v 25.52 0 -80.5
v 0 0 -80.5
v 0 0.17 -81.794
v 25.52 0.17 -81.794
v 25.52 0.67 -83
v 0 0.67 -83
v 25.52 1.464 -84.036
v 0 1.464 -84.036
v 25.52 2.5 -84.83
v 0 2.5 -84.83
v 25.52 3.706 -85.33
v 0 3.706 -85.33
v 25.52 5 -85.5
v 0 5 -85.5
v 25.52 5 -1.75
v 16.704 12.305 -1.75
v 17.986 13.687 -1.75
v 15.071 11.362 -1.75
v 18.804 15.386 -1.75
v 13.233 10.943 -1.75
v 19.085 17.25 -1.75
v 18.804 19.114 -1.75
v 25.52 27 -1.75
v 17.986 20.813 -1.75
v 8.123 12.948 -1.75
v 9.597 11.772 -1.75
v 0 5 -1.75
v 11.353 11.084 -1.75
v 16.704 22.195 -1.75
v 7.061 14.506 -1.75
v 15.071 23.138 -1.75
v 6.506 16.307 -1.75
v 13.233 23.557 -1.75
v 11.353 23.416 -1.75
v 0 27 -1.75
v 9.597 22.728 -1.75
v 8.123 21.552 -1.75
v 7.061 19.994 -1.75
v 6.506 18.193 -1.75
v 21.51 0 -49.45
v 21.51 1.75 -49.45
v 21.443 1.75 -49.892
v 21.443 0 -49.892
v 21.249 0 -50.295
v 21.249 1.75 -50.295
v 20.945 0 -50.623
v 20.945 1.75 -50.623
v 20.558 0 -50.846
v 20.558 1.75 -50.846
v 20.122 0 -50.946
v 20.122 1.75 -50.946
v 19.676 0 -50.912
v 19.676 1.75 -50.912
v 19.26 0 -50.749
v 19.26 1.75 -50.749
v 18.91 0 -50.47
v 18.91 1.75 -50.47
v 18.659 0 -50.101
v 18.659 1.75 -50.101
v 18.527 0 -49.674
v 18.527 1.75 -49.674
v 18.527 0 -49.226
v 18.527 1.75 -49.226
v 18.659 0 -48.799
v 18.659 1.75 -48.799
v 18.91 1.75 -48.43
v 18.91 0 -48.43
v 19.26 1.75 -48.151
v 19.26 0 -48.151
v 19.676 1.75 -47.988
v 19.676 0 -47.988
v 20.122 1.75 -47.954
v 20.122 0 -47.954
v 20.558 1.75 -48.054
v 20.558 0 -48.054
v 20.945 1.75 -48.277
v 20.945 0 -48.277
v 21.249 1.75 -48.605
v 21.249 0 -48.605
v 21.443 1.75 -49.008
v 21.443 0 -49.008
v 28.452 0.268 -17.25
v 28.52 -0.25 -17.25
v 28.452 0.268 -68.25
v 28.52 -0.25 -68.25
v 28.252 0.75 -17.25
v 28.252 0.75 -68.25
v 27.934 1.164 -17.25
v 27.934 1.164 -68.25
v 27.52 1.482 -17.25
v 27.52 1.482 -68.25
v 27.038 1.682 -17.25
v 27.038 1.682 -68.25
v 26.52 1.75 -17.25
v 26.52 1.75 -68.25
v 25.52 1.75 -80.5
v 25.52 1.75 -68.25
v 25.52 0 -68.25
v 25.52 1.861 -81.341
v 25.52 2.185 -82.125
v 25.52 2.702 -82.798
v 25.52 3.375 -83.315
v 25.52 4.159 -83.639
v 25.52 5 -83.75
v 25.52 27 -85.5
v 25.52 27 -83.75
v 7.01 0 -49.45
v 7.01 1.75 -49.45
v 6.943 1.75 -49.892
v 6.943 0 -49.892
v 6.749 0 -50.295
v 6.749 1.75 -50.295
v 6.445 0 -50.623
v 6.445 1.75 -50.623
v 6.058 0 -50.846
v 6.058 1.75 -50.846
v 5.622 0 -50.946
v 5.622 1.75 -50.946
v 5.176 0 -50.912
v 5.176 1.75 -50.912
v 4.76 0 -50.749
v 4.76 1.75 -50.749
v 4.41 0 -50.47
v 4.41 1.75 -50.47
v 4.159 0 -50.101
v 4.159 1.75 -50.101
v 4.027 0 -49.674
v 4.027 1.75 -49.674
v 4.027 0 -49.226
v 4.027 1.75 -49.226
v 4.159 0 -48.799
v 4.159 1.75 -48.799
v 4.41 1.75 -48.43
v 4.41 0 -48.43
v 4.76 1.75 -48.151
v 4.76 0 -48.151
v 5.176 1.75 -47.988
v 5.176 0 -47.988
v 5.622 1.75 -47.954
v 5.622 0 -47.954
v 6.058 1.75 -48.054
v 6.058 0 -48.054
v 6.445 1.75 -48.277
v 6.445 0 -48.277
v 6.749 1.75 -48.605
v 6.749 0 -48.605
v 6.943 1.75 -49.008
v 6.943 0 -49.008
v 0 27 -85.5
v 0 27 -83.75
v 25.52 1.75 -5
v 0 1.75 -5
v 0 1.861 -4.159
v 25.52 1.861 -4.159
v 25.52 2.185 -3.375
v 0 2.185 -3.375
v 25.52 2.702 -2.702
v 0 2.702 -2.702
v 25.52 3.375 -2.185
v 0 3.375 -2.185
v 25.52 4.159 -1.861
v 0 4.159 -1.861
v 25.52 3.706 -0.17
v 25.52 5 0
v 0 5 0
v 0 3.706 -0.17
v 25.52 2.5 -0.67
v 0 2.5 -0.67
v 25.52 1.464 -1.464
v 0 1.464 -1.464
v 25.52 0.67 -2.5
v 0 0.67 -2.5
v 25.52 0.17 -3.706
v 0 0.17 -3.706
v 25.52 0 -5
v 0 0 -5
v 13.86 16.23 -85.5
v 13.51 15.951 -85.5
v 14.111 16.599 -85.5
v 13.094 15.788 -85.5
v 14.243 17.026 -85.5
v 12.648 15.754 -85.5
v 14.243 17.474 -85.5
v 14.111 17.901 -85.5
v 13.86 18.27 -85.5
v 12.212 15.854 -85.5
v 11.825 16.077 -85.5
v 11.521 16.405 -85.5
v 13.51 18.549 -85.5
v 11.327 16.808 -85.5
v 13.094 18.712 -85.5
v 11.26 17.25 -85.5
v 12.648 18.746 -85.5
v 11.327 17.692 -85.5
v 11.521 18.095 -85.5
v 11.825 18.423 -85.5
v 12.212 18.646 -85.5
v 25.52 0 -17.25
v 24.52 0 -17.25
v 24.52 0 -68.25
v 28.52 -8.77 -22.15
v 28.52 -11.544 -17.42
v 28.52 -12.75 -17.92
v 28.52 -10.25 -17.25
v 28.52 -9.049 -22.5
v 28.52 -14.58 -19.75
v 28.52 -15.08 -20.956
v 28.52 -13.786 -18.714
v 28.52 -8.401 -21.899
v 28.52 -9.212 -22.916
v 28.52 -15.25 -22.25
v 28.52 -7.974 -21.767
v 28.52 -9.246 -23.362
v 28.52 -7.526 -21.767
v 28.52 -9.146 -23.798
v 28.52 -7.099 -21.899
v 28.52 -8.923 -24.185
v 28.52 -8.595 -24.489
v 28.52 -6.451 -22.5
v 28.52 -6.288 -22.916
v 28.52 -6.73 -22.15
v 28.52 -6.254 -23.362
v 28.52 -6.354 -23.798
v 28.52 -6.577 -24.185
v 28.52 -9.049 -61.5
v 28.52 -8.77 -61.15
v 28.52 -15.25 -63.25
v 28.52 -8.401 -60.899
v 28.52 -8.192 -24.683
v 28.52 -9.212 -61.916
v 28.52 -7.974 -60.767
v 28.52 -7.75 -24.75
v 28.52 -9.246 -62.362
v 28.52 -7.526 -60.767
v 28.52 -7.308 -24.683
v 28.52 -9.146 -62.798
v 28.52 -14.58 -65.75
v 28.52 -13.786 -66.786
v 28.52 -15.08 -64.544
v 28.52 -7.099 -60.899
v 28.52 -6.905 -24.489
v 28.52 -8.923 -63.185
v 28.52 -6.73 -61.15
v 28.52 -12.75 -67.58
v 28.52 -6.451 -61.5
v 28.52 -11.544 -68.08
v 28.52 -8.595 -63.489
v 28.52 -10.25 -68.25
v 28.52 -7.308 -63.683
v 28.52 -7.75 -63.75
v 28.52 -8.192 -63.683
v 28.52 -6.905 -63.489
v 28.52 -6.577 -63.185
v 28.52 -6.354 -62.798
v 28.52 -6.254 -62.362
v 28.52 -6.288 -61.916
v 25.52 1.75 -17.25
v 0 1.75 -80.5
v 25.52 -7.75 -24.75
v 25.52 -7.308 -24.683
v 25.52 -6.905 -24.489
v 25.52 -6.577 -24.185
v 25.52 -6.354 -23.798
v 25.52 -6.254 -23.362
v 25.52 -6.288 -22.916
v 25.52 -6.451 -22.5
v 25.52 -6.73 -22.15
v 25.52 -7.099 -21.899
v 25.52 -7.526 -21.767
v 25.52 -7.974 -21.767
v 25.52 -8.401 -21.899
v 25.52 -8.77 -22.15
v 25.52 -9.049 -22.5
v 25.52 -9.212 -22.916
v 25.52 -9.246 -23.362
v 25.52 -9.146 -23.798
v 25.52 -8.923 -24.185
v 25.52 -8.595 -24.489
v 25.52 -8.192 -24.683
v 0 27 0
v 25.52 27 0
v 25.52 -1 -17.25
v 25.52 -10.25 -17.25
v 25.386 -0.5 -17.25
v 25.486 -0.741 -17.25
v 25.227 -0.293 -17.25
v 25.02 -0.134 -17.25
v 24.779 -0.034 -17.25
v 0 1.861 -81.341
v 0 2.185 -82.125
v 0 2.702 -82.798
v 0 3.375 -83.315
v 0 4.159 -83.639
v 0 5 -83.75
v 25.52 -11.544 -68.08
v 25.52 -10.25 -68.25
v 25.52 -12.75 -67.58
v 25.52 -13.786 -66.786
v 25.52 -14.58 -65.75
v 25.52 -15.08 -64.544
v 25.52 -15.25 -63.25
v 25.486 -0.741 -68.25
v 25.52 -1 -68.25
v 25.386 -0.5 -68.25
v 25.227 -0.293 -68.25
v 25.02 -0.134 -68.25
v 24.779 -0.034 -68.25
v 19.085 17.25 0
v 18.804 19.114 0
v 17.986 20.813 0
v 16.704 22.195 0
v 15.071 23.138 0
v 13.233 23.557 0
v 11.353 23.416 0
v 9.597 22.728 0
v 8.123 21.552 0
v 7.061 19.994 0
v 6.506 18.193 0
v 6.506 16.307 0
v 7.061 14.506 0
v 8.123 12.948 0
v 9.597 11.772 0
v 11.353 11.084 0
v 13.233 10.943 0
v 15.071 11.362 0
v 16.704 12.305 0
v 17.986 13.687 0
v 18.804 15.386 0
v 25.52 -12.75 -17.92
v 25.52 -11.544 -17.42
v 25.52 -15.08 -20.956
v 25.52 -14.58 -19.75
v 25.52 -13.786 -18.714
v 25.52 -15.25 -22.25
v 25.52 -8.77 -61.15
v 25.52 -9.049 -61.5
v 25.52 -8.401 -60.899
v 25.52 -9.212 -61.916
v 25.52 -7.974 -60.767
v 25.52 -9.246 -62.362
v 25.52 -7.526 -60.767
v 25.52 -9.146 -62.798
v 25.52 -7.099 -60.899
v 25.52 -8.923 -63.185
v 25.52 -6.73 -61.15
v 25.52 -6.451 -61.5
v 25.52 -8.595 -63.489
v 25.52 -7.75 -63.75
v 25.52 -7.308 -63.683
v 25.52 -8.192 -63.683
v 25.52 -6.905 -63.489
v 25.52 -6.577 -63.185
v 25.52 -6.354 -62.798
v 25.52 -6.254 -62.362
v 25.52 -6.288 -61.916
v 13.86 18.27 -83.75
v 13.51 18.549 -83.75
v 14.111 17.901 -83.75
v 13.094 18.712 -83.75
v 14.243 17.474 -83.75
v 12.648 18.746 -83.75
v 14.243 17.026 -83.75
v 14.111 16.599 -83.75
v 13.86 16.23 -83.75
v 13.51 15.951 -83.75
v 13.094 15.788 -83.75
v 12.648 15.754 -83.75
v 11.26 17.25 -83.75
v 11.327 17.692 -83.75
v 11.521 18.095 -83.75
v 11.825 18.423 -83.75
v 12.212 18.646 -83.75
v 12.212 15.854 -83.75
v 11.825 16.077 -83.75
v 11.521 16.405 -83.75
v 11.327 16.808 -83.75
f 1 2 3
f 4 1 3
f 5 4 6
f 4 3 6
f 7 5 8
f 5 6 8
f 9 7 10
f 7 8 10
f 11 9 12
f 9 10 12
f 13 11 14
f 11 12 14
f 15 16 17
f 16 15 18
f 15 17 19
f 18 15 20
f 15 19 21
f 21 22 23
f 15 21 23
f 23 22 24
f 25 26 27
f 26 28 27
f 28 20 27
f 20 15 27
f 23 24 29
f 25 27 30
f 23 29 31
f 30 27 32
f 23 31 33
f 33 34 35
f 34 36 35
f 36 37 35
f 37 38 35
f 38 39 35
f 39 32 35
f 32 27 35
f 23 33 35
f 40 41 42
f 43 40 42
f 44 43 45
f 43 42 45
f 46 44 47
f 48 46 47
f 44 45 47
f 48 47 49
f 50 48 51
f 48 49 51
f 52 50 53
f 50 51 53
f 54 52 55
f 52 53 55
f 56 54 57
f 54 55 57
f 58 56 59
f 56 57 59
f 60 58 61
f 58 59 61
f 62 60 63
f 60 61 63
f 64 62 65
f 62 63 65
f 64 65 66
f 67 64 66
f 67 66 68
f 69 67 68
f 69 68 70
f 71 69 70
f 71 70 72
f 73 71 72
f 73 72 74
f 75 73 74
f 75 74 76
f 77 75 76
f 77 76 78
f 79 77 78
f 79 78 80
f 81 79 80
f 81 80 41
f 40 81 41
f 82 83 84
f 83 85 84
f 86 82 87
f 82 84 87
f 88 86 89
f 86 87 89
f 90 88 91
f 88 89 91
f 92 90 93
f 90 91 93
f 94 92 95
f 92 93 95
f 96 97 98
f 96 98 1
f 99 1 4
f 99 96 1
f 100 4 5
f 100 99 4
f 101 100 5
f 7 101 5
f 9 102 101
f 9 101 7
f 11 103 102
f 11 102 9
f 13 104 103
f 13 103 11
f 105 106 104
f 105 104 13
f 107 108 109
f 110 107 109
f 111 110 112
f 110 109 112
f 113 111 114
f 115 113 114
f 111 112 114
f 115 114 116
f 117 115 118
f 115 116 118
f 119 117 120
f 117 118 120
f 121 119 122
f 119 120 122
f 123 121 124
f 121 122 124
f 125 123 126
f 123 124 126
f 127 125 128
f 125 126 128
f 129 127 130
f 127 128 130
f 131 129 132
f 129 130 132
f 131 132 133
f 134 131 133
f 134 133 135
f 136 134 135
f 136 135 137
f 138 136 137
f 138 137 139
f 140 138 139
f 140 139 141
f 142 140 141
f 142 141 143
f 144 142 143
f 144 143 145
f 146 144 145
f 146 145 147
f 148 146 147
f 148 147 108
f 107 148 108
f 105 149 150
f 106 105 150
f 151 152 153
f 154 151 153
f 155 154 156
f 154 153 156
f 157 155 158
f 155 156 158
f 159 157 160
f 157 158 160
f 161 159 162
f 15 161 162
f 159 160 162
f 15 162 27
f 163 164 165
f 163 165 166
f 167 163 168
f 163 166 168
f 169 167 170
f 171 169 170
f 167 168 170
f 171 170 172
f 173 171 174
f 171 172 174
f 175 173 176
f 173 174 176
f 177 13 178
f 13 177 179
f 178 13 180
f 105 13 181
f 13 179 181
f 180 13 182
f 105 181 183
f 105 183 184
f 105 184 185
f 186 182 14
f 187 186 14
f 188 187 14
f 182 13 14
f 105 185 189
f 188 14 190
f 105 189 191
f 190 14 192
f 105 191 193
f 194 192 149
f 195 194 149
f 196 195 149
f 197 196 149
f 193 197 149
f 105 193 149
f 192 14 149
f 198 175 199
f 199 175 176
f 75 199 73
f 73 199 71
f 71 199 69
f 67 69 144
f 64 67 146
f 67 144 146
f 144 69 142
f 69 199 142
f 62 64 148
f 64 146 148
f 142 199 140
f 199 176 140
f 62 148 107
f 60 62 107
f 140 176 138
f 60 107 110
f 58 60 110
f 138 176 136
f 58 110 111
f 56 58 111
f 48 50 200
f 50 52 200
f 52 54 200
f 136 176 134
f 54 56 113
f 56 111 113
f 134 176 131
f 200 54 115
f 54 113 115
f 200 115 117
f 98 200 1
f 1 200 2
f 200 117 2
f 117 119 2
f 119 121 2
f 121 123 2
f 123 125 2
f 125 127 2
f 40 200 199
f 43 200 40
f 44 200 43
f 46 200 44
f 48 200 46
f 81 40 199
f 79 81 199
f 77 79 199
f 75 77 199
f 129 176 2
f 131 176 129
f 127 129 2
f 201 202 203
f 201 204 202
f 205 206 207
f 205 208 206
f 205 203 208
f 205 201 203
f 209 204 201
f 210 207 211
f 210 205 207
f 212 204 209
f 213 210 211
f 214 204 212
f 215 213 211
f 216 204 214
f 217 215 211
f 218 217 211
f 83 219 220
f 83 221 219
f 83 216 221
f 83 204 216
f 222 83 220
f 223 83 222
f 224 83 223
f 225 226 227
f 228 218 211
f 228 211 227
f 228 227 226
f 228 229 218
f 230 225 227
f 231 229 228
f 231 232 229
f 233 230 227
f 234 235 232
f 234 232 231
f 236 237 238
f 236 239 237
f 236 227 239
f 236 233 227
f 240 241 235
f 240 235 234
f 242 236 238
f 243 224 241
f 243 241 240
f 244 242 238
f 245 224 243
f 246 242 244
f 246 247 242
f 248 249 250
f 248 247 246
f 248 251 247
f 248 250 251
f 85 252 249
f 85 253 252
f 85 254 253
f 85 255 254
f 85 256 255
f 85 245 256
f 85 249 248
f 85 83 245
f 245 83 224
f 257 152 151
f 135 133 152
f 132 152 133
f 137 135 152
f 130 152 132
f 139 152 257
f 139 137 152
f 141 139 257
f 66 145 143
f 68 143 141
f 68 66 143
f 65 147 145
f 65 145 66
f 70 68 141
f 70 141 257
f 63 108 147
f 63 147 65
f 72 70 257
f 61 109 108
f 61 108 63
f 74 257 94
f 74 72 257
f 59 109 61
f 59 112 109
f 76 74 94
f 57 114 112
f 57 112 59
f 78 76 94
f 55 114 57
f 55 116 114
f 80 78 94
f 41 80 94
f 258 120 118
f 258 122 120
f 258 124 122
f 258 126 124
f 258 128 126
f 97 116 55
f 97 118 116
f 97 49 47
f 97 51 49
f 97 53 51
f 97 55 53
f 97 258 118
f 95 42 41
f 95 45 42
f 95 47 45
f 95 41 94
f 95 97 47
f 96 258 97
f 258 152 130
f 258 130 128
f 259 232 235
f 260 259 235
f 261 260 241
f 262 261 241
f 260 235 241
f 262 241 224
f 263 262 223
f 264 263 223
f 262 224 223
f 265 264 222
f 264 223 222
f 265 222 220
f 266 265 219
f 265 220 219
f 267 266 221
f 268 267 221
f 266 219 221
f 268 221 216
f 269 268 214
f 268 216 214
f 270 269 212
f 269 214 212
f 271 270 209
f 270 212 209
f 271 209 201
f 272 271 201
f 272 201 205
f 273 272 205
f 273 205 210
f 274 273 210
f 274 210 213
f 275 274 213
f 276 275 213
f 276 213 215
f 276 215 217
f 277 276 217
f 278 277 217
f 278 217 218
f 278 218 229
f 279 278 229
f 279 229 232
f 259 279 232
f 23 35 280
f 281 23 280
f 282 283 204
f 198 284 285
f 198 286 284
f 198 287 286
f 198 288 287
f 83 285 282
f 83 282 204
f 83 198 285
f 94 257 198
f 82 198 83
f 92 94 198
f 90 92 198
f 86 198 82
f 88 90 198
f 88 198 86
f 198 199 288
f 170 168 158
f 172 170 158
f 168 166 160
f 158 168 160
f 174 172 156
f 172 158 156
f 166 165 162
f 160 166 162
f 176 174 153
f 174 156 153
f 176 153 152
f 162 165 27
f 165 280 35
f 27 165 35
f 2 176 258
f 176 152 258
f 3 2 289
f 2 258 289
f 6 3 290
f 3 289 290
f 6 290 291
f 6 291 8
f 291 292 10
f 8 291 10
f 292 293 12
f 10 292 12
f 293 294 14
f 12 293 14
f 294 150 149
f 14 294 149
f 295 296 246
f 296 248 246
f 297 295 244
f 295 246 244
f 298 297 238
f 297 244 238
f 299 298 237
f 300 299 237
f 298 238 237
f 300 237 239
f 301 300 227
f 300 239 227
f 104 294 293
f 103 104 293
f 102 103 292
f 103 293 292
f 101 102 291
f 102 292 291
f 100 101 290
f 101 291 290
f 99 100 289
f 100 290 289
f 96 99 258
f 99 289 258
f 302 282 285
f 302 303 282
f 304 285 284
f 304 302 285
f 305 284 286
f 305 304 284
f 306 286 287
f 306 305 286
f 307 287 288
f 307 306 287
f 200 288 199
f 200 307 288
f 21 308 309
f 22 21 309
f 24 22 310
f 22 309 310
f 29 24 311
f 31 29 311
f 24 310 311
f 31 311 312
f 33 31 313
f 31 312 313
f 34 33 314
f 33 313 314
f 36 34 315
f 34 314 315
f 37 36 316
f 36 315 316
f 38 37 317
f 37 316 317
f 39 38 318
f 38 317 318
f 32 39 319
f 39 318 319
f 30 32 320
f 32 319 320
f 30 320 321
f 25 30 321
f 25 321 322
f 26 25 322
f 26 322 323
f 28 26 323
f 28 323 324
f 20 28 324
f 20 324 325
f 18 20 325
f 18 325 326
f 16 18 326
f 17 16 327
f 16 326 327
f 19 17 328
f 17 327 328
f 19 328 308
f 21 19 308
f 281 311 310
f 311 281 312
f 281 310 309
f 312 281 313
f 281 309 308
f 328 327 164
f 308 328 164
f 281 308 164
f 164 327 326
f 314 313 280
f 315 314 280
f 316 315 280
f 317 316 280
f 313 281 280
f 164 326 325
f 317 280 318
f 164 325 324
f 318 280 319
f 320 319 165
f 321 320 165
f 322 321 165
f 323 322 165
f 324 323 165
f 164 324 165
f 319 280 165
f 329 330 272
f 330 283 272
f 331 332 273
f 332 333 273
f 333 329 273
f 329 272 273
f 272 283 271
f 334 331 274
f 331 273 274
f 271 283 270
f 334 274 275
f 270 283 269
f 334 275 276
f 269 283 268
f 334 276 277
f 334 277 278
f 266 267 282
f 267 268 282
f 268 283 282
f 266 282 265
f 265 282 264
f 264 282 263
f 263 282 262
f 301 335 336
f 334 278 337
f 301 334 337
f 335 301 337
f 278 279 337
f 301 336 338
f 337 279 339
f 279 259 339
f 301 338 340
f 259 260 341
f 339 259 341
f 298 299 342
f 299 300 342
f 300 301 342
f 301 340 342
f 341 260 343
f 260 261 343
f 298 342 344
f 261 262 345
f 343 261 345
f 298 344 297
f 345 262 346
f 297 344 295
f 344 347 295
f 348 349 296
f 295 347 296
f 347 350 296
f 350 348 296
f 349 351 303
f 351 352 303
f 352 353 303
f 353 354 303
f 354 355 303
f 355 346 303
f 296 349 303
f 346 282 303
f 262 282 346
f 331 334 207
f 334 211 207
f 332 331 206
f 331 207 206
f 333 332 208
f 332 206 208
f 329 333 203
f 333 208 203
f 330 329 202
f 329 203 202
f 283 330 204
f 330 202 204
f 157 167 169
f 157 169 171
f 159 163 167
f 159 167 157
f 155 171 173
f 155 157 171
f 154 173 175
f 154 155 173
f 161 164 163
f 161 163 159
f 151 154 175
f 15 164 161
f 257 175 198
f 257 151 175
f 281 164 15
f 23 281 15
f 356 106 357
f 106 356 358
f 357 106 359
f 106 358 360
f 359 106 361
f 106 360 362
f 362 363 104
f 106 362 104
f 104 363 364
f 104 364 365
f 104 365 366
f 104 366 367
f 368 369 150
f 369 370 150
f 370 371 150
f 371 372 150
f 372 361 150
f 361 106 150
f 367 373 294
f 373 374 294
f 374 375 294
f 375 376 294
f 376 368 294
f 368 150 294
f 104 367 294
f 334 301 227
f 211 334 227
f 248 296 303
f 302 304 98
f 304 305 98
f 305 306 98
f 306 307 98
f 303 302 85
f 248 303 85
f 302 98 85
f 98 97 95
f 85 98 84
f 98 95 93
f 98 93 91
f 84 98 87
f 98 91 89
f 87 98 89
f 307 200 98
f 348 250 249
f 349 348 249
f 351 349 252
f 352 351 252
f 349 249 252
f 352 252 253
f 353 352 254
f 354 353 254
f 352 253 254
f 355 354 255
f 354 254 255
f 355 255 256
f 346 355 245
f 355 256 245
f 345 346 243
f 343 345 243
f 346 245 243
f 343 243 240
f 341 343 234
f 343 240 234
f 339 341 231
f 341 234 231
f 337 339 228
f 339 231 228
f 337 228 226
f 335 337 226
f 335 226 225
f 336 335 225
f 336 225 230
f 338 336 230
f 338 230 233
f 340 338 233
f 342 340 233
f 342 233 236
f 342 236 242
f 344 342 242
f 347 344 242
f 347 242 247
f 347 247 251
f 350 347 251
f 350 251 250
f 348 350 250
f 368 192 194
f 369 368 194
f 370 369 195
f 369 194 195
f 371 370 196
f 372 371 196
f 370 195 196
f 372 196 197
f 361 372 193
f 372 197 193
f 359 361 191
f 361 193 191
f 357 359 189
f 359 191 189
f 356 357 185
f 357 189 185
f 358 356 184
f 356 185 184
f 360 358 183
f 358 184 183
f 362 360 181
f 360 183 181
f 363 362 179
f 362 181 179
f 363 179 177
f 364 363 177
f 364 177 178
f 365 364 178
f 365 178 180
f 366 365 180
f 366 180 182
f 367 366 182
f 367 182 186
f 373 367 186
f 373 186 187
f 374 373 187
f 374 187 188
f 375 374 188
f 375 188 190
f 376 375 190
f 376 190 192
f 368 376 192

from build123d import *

# Parameters (mm, degrees)
BOSS_EXTRU_1_DEPTH      = 25.52
ESQUISSE2_R             = 6.325
ENL_V_MAT_EXTRU_1_DEPTH = 1.75
ESQUISSE3_R             = 1.5
ENL_V_MAT_EXTRU_2_DEPTH = 25.52
ESQUISSE6_W             = 3
ESQUISSE6_H             = 51
BOSS_EXTRU_2_DEPTH      = 17
CONG_1_R                = 2
CONG_2_R                = 1
ESQUISSE7_R             = 1.5
ENL_V_MAT_EXTRU_3_DEPTH = 29.52
CONG_3_R                = 5
ESQUISSE8_R             = 1.5
ENL_V_MAT_EXTRU_4_DEPTH = 18


with BuildPart() as part:
    # Esquisse1 → Boss.-Extru.1 (new body)
    with BuildSketch(Plane(origin=(0, 0, 0), x_dir=(0, 0, -1), z_dir=(1, 0, 0))):
        with BuildLine():
            Line((0, 27), (0, 5))
            ThreePointArc((0, 5), (1.464466094, 1.464466094), (5, 0))
            Line((5, 0), (80.5, 0))
            ThreePointArc((80.5, 0), (84.035533906, 1.464466094), (85.5, 5))
            Line((85.5, 5), (85.5, 27))
            Line((85.5, 27), (83.75, 27))
            Line((83.75, 27), (83.75, 5))
            ThreePointArc((83.75, 5), (82.798097039, 2.701902961), (80.5, 1.75))
            Line((80.5, 1.75), (5, 1.75))
            ThreePointArc((5, 1.75), (2.701902961, 2.701902961), (1.75, 5))
            Line((1.75, 5), (1.75, 27))
            Line((1.75, 27), (0, 27))
        make_face()
    extrude(amount=BOSS_EXTRU_1_DEPTH)

    # Esquisse2 → Enlèv. mat.-Extru.1 (cut)
    with BuildSketch(Plane.XY):
        with Locations((12.76, 17.25)):
            Circle(ESQUISSE2_R)
    extrude(amount=-ENL_V_MAT_EXTRU_1_DEPTH, mode=Mode.SUBTRACT)

    # Esquisse3 → Enlèv. mat.-Extru.2 (cut)
    with BuildSketch(Plane(origin=(0, 0, -85.5), x_dir=(-1, 0, 0), z_dir=(0, 0, -1))):
        with Locations((-12.76, 17.25)):
            Circle(ESQUISSE3_R)
    extrude(amount=-ENL_V_MAT_EXTRU_2_DEPTH, mode=Mode.SUBTRACT)

    # Esquisse6 → Boss.-Extru.2 (add)
    with BuildSketch(Plane(origin=(0, 1.75, 0), x_dir=(1, 0, 0), z_dir=(0, 1, 0))):
        with Locations((27.02, 42.75)):
            Rectangle(ESQUISSE6_W, ESQUISSE6_H)
    extrude(amount=-BOSS_EXTRU_2_DEPTH)

    # Congé1
    cong_1_edges = [part.edges().sort_by_distance(p)[0] for p in [
        (28.52, 1.75, -42.75),
    ]]
    fillet(cong_1_edges, radius=CONG_1_R)

    # Congé2
    cong_2_edges = [part.edges().sort_by_distance(p)[0] for p in [
        (25.52, 0, -42.75),
    ]]
    fillet(cong_2_edges, radius=CONG_2_R)

    # Esquisse7 → Enlèv. mat.-Extru.3 (cut, through all)
    with BuildSketch(Plane(origin=(28.52, 0, 0), x_dir=(0, 0, -1), z_dir=(1, 0, 0))):
        with Locations((23.25, -7.75)):
            Circle(ESQUISSE7_R)
        with Locations((62.25, -7.75)):
            Circle(ESQUISSE7_R)
    extrude(amount=-ENL_V_MAT_EXTRU_3_DEPTH, mode=Mode.SUBTRACT)

    # Congé3
    cong_3_edges = [part.edges().sort_by_distance(p)[0] for p in [
        (27.02, -15.25, -68.25),
        (27.02, -15.25, -17.25),
    ]]
    fillet(cong_3_edges, radius=CONG_3_R)

    # Esquisse8 → Enlèv. mat.-Extru.4 (cut, through all)
    with BuildSketch(Plane(origin=(0, 1.75, 0), x_dir=(1, 0, 0), z_dir=(0, 1, 0))):
        with Locations((20.01, 49.45)):
            Circle(ESQUISSE8_R)
        with Locations((5.51, 49.45)):
            Circle(ESQUISSE8_R)
    extrude(amount=-ENL_V_MAT_EXTRU_4_DEPTH, mode=Mode.SUBTRACT)


solid = part.part
